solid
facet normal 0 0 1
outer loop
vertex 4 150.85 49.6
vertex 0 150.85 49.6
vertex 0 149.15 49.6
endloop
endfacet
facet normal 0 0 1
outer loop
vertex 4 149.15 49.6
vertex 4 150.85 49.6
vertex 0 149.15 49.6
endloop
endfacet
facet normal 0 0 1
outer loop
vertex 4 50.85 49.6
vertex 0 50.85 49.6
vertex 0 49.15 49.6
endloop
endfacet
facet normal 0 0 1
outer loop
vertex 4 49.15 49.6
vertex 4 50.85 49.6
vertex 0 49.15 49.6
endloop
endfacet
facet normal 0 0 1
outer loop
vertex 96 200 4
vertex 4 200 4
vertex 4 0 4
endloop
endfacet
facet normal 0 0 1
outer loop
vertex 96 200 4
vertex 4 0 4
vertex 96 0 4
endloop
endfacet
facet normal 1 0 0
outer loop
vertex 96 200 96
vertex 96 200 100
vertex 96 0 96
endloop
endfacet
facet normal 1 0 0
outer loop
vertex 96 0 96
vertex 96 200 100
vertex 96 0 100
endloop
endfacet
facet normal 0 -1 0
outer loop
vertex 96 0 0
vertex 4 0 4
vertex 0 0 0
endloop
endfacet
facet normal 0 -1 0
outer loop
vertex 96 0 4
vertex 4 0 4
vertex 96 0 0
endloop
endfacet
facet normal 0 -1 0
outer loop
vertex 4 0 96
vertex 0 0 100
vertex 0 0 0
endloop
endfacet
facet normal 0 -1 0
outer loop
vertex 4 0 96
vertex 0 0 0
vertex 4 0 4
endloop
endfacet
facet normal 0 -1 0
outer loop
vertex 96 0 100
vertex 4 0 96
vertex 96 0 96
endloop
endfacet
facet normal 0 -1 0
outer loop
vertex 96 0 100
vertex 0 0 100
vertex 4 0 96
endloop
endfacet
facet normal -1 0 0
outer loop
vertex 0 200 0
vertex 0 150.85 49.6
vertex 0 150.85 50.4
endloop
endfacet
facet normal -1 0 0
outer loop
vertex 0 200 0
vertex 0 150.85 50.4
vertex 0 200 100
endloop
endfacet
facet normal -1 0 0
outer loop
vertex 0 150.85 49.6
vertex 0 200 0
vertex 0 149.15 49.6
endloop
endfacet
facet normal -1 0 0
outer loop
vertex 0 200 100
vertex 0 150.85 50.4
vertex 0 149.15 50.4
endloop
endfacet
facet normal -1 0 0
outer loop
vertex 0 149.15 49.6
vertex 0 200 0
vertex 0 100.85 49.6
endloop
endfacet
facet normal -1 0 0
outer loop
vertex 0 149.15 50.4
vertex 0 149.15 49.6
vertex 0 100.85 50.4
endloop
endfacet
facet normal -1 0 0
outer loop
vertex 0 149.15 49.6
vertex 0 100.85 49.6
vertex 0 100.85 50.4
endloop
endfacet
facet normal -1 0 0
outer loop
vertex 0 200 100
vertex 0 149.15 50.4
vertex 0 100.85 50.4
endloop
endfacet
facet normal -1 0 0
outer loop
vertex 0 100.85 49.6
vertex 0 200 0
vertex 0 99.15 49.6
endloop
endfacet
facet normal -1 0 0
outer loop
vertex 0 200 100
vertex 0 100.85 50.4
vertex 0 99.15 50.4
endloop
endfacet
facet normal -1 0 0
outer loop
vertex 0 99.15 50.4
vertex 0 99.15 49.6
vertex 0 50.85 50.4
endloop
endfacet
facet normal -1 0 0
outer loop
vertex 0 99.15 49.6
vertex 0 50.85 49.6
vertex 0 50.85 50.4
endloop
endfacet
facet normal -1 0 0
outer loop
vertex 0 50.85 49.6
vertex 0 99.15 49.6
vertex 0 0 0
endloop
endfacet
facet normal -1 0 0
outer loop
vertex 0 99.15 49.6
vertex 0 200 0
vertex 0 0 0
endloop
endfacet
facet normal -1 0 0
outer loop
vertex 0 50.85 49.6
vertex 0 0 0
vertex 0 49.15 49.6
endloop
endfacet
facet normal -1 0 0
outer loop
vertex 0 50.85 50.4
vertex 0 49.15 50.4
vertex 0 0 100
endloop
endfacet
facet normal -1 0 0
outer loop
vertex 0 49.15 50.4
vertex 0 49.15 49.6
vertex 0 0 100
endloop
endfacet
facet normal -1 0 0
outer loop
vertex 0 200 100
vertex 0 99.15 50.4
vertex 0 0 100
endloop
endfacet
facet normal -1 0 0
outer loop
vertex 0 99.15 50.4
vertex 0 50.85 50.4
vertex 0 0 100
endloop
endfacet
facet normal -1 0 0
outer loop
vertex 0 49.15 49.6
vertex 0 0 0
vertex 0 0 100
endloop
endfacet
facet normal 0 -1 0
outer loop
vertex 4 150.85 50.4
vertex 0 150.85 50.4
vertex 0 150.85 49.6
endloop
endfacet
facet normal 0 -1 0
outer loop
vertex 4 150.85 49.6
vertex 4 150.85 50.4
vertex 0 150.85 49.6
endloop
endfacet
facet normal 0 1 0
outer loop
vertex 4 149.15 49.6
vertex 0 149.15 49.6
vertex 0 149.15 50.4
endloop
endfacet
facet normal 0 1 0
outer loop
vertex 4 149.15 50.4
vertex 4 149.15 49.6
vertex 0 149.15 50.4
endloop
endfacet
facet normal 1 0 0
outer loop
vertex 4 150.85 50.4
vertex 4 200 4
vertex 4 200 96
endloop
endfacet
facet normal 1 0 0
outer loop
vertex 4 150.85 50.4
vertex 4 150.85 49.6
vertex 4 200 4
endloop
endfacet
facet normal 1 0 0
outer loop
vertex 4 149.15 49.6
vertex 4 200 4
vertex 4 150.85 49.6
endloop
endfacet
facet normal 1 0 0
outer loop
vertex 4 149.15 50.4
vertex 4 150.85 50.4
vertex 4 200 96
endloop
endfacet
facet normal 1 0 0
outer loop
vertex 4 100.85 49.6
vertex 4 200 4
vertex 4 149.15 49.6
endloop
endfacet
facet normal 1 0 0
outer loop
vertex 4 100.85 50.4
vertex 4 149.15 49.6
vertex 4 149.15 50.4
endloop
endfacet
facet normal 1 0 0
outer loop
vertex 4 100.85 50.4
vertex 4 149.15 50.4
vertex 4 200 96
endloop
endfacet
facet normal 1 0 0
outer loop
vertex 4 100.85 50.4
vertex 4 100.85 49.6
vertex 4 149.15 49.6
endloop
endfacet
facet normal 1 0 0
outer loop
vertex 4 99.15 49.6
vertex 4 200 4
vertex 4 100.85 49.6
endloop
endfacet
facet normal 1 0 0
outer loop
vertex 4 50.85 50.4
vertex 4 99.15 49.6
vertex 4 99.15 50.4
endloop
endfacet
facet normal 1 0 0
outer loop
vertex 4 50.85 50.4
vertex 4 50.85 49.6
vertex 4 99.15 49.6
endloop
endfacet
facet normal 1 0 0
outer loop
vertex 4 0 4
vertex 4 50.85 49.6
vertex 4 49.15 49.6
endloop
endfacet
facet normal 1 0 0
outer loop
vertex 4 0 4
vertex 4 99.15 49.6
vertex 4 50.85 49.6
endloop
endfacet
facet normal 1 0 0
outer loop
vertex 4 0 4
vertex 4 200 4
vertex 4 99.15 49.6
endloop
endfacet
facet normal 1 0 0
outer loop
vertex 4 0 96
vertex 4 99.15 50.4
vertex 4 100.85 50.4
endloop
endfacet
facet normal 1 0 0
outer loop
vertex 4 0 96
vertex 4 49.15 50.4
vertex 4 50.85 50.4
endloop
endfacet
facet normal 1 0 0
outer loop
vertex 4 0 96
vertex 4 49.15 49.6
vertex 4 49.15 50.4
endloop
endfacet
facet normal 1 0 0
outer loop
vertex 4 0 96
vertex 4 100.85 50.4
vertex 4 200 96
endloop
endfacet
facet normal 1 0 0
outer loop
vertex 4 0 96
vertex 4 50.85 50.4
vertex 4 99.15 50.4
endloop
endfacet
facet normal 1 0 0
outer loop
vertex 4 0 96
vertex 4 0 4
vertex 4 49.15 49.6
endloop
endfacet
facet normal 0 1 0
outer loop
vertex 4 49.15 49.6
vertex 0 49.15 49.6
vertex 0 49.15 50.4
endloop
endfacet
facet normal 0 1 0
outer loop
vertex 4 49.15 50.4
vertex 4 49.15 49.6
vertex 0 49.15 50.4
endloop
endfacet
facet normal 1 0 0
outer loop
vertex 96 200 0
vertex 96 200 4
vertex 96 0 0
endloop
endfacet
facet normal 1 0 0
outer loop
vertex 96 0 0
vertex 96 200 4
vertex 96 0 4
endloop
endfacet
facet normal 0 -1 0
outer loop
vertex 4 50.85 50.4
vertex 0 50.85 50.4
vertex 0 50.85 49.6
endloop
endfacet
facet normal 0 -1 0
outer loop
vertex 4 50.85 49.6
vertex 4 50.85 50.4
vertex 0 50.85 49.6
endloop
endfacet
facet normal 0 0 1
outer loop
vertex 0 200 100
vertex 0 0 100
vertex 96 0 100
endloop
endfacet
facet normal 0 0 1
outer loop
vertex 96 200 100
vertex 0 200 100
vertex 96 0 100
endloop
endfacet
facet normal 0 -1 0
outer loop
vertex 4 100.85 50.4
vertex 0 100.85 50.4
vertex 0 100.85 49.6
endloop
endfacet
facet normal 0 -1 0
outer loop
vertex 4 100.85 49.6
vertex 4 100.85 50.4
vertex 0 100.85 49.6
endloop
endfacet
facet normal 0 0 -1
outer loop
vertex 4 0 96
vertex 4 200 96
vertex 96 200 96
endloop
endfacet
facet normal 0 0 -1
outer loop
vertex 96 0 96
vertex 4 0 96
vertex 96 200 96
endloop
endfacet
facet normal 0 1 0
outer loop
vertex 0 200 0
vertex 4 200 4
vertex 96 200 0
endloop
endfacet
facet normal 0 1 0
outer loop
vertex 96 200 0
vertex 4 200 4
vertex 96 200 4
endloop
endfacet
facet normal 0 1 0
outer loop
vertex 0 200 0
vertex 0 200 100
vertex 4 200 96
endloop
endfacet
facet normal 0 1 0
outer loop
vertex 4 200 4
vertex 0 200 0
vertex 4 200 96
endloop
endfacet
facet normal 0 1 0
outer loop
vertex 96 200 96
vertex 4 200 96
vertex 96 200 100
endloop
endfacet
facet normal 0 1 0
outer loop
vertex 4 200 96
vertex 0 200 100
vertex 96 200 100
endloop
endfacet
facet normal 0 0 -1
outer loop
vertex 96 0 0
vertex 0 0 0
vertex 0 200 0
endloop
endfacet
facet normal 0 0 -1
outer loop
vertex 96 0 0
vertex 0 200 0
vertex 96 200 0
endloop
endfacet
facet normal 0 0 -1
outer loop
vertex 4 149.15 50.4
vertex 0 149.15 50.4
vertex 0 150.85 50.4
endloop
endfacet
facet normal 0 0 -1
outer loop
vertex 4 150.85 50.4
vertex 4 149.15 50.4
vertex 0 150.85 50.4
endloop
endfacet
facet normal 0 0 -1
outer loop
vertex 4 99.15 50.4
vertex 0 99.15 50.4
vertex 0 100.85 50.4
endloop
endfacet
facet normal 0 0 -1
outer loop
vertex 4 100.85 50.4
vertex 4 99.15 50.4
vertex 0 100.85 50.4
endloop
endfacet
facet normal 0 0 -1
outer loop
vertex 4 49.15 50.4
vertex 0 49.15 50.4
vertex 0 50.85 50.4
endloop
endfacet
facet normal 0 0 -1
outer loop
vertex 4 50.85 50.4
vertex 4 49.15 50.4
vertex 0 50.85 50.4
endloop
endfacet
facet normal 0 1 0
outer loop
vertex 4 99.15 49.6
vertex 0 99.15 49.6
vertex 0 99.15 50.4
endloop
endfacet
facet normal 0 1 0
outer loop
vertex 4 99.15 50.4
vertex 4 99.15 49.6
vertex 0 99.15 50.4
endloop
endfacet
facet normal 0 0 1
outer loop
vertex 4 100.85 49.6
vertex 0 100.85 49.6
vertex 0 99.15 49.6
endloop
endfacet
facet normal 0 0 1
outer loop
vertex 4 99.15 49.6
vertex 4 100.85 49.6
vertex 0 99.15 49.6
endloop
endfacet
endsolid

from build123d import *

# Parameters (mm, degrees)
F0_W      = 100
F0_H      = 100
F1_DEPTH  = 200
F2_W      = 92
F2_H      = 92
F3_DEPTH  = 200
F4_R      = 5
F5_DEPTH  = 4
F7_DEPTH  = 4
F4_R_2    = 7
F8_DEPTH  = 20
F11_DEPTH = 1
F12_DEPTH = 20
F13_W     = 216.226272
F13_H     = 124.404148
F14_DEPTH = 304.8


with BuildPart() as f1:
    # F0 (on Front) → F1 (new body)
    with BuildSketch(Plane.XZ):
        with Locations((50, 50)):
            Rectangle(F0_W, F0_H)
    extrude(amount=-F1_DEPTH)

    # F2 (on face) → F3 (cut)
    with BuildSketch(Plane.XZ):
        with Locations((50, 50)):
            Rectangle(F2_W, F2_H)
    extrude(amount=-F3_DEPTH, mode=Mode.SUBTRACT)

    # F4 (on face) → F5 (cut)
    with BuildSketch(Plane.YZ.offset(100)):
        with Locations((50, 50)):
            Circle(F4_R)
        with Locations((100, 50)):
            Circle(F4_R)
        with Locations((150, 50)):
            Circle(F4_R)
    extrude(amount=-F5_DEPTH, mode=Mode.SUBTRACT)

    # F6 (on face) → F7 (cut)
    with BuildSketch(Plane(origin=(0, 0, 0), x_dir=(0, -1, 0), z_dir=(-1, 0, 0))):
        Polygon((-50, 50.4), (-50.85, 50.4), (-50.85, 49.6), (-49.15, 49.6), (-49.15, 50.4), align=None)
        Polygon((-100, 50.4), (-100.85, 50.4), (-100.85, 49.6), (-99.15, 49.6), (-99.15, 50.4), align=None)
        Polygon((-150, 50), (-150, 49.6), (-149.15, 49.6), (-149.15, 50.4), (-150, 50.4), align=None)
        Polygon((-150.85, 49.6), (-150, 49.6), (-150, 50), (-150, 50.4), (-150.85, 50.4), align=None)
    extrude(amount=-F7_DEPTH, mode=Mode.SUBTRACT)

    # F4 (on face) → F8 (join)
    with BuildSketch(Plane.YZ.offset(100)):
        with Locations((50, 50)):
            Circle(F4_R_2)
        with Locations((50, 50)):
            Circle(F4_R, mode=Mode.SUBTRACT)
        with Locations((100, 50)):
            Circle(F4_R_2)
        with Locations((100, 50)):
            Circle(F4_R, mode=Mode.SUBTRACT)
        with Locations((150, 50)):
            Circle(F4_R_2)
        with Locations((150, 50)):
            Circle(F4_R, mode=Mode.SUBTRACT)
    extrude(amount=F8_DEPTH)

    # F10 (on face) → F11 (join)
    with BuildSketch(Plane(origin=(96, 0, 0), x_dir=(0, -1, 0), z_dir=(-1, 0, 0))):
        with BuildLine():
            Line((-45.069934, 49.166667), (-49.99933, 49.166667))
            Line((-49.99933, 49.166667), (-54.930066, 49.166667))
            ThreePointArc((-54.930066, 49.166667), (-50, 45), (-45.069934, 49.166667))
        make_face()
        with BuildLine():
            Line((-95.069934, 49.166667), (-99.99933, 49.166667))
            Line((-99.99933, 49.166667), (-104.930066, 49.166667))
            ThreePointArc((-104.930066, 49.166667), (-100, 45), (-95.069934, 49.166667))
        make_face()
        with BuildLine():
            Line((-145.069934, 49.166667), (-149.99933, 49.166667))
            Line((-149.99933, 49.166667), (-154.930066, 49.166667))
            ThreePointArc((-154.930066, 49.166667), (-150, 45), (-145.069934, 49.166667))
        make_face()
    extrude(amount=-F11_DEPTH)

    # F9 (on face) → F12 (join)
    with BuildSketch(Plane.YZ.offset(120)):
        with BuildLine():
            Line((47.001097, 54.000823), (47.001097, 56.325076))
            ThreePointArc((47.001097, 56.325076), (46.257829, 44.084245), (57, 50))
            ThreePointArc((57, 50), (55.91608, 53.741657), (53, 56.324555))
            Line((53, 56.324555), (53, 54))
            ThreePointArc((53, 54), (54.472136, 52.236068), (55, 50))
            ThreePointArc((55, 50), (47.763319, 45.528171), (47.001097, 54.000823))
        make_face()
        with BuildLine():
            Line((103, 56.324555), (103, 54))
            ThreePointArc((103, 54), (99.999314, 45), (97.001097, 54.000823))
            Line((97.001097, 54.000823), (97.001097, 56.325076))
            ThreePointArc((97.001097, 56.325076), (99.999393, 43), (103, 56.324555))
        make_face()
        with BuildLine():
            Line((153, 56.324555), (153, 54))
            ThreePointArc((153, 54), (149.999314, 45), (147.001097, 54.000823))
            Line((147.001097, 54.000823), (147.001097, 56.325076))
            ThreePointArc((147.001097, 56.325076), (149.999393, 43), (153, 56.324555))
        make_face()
    extrude(amount=F12_DEPTH)

    # F13 (on face) → F14 (cut)
    with BuildSketch(Plane(origin=(96, 0, 0), x_dir=(0, -1, 0), z_dir=(-1, 0, 0))):
        with Locations((-99.291925, 46.610653)):
            Rectangle(F13_W, F13_H)
    extrude(amount=-F14_DEPTH, mode=Mode.SUBTRACT)


solid = f1.part
